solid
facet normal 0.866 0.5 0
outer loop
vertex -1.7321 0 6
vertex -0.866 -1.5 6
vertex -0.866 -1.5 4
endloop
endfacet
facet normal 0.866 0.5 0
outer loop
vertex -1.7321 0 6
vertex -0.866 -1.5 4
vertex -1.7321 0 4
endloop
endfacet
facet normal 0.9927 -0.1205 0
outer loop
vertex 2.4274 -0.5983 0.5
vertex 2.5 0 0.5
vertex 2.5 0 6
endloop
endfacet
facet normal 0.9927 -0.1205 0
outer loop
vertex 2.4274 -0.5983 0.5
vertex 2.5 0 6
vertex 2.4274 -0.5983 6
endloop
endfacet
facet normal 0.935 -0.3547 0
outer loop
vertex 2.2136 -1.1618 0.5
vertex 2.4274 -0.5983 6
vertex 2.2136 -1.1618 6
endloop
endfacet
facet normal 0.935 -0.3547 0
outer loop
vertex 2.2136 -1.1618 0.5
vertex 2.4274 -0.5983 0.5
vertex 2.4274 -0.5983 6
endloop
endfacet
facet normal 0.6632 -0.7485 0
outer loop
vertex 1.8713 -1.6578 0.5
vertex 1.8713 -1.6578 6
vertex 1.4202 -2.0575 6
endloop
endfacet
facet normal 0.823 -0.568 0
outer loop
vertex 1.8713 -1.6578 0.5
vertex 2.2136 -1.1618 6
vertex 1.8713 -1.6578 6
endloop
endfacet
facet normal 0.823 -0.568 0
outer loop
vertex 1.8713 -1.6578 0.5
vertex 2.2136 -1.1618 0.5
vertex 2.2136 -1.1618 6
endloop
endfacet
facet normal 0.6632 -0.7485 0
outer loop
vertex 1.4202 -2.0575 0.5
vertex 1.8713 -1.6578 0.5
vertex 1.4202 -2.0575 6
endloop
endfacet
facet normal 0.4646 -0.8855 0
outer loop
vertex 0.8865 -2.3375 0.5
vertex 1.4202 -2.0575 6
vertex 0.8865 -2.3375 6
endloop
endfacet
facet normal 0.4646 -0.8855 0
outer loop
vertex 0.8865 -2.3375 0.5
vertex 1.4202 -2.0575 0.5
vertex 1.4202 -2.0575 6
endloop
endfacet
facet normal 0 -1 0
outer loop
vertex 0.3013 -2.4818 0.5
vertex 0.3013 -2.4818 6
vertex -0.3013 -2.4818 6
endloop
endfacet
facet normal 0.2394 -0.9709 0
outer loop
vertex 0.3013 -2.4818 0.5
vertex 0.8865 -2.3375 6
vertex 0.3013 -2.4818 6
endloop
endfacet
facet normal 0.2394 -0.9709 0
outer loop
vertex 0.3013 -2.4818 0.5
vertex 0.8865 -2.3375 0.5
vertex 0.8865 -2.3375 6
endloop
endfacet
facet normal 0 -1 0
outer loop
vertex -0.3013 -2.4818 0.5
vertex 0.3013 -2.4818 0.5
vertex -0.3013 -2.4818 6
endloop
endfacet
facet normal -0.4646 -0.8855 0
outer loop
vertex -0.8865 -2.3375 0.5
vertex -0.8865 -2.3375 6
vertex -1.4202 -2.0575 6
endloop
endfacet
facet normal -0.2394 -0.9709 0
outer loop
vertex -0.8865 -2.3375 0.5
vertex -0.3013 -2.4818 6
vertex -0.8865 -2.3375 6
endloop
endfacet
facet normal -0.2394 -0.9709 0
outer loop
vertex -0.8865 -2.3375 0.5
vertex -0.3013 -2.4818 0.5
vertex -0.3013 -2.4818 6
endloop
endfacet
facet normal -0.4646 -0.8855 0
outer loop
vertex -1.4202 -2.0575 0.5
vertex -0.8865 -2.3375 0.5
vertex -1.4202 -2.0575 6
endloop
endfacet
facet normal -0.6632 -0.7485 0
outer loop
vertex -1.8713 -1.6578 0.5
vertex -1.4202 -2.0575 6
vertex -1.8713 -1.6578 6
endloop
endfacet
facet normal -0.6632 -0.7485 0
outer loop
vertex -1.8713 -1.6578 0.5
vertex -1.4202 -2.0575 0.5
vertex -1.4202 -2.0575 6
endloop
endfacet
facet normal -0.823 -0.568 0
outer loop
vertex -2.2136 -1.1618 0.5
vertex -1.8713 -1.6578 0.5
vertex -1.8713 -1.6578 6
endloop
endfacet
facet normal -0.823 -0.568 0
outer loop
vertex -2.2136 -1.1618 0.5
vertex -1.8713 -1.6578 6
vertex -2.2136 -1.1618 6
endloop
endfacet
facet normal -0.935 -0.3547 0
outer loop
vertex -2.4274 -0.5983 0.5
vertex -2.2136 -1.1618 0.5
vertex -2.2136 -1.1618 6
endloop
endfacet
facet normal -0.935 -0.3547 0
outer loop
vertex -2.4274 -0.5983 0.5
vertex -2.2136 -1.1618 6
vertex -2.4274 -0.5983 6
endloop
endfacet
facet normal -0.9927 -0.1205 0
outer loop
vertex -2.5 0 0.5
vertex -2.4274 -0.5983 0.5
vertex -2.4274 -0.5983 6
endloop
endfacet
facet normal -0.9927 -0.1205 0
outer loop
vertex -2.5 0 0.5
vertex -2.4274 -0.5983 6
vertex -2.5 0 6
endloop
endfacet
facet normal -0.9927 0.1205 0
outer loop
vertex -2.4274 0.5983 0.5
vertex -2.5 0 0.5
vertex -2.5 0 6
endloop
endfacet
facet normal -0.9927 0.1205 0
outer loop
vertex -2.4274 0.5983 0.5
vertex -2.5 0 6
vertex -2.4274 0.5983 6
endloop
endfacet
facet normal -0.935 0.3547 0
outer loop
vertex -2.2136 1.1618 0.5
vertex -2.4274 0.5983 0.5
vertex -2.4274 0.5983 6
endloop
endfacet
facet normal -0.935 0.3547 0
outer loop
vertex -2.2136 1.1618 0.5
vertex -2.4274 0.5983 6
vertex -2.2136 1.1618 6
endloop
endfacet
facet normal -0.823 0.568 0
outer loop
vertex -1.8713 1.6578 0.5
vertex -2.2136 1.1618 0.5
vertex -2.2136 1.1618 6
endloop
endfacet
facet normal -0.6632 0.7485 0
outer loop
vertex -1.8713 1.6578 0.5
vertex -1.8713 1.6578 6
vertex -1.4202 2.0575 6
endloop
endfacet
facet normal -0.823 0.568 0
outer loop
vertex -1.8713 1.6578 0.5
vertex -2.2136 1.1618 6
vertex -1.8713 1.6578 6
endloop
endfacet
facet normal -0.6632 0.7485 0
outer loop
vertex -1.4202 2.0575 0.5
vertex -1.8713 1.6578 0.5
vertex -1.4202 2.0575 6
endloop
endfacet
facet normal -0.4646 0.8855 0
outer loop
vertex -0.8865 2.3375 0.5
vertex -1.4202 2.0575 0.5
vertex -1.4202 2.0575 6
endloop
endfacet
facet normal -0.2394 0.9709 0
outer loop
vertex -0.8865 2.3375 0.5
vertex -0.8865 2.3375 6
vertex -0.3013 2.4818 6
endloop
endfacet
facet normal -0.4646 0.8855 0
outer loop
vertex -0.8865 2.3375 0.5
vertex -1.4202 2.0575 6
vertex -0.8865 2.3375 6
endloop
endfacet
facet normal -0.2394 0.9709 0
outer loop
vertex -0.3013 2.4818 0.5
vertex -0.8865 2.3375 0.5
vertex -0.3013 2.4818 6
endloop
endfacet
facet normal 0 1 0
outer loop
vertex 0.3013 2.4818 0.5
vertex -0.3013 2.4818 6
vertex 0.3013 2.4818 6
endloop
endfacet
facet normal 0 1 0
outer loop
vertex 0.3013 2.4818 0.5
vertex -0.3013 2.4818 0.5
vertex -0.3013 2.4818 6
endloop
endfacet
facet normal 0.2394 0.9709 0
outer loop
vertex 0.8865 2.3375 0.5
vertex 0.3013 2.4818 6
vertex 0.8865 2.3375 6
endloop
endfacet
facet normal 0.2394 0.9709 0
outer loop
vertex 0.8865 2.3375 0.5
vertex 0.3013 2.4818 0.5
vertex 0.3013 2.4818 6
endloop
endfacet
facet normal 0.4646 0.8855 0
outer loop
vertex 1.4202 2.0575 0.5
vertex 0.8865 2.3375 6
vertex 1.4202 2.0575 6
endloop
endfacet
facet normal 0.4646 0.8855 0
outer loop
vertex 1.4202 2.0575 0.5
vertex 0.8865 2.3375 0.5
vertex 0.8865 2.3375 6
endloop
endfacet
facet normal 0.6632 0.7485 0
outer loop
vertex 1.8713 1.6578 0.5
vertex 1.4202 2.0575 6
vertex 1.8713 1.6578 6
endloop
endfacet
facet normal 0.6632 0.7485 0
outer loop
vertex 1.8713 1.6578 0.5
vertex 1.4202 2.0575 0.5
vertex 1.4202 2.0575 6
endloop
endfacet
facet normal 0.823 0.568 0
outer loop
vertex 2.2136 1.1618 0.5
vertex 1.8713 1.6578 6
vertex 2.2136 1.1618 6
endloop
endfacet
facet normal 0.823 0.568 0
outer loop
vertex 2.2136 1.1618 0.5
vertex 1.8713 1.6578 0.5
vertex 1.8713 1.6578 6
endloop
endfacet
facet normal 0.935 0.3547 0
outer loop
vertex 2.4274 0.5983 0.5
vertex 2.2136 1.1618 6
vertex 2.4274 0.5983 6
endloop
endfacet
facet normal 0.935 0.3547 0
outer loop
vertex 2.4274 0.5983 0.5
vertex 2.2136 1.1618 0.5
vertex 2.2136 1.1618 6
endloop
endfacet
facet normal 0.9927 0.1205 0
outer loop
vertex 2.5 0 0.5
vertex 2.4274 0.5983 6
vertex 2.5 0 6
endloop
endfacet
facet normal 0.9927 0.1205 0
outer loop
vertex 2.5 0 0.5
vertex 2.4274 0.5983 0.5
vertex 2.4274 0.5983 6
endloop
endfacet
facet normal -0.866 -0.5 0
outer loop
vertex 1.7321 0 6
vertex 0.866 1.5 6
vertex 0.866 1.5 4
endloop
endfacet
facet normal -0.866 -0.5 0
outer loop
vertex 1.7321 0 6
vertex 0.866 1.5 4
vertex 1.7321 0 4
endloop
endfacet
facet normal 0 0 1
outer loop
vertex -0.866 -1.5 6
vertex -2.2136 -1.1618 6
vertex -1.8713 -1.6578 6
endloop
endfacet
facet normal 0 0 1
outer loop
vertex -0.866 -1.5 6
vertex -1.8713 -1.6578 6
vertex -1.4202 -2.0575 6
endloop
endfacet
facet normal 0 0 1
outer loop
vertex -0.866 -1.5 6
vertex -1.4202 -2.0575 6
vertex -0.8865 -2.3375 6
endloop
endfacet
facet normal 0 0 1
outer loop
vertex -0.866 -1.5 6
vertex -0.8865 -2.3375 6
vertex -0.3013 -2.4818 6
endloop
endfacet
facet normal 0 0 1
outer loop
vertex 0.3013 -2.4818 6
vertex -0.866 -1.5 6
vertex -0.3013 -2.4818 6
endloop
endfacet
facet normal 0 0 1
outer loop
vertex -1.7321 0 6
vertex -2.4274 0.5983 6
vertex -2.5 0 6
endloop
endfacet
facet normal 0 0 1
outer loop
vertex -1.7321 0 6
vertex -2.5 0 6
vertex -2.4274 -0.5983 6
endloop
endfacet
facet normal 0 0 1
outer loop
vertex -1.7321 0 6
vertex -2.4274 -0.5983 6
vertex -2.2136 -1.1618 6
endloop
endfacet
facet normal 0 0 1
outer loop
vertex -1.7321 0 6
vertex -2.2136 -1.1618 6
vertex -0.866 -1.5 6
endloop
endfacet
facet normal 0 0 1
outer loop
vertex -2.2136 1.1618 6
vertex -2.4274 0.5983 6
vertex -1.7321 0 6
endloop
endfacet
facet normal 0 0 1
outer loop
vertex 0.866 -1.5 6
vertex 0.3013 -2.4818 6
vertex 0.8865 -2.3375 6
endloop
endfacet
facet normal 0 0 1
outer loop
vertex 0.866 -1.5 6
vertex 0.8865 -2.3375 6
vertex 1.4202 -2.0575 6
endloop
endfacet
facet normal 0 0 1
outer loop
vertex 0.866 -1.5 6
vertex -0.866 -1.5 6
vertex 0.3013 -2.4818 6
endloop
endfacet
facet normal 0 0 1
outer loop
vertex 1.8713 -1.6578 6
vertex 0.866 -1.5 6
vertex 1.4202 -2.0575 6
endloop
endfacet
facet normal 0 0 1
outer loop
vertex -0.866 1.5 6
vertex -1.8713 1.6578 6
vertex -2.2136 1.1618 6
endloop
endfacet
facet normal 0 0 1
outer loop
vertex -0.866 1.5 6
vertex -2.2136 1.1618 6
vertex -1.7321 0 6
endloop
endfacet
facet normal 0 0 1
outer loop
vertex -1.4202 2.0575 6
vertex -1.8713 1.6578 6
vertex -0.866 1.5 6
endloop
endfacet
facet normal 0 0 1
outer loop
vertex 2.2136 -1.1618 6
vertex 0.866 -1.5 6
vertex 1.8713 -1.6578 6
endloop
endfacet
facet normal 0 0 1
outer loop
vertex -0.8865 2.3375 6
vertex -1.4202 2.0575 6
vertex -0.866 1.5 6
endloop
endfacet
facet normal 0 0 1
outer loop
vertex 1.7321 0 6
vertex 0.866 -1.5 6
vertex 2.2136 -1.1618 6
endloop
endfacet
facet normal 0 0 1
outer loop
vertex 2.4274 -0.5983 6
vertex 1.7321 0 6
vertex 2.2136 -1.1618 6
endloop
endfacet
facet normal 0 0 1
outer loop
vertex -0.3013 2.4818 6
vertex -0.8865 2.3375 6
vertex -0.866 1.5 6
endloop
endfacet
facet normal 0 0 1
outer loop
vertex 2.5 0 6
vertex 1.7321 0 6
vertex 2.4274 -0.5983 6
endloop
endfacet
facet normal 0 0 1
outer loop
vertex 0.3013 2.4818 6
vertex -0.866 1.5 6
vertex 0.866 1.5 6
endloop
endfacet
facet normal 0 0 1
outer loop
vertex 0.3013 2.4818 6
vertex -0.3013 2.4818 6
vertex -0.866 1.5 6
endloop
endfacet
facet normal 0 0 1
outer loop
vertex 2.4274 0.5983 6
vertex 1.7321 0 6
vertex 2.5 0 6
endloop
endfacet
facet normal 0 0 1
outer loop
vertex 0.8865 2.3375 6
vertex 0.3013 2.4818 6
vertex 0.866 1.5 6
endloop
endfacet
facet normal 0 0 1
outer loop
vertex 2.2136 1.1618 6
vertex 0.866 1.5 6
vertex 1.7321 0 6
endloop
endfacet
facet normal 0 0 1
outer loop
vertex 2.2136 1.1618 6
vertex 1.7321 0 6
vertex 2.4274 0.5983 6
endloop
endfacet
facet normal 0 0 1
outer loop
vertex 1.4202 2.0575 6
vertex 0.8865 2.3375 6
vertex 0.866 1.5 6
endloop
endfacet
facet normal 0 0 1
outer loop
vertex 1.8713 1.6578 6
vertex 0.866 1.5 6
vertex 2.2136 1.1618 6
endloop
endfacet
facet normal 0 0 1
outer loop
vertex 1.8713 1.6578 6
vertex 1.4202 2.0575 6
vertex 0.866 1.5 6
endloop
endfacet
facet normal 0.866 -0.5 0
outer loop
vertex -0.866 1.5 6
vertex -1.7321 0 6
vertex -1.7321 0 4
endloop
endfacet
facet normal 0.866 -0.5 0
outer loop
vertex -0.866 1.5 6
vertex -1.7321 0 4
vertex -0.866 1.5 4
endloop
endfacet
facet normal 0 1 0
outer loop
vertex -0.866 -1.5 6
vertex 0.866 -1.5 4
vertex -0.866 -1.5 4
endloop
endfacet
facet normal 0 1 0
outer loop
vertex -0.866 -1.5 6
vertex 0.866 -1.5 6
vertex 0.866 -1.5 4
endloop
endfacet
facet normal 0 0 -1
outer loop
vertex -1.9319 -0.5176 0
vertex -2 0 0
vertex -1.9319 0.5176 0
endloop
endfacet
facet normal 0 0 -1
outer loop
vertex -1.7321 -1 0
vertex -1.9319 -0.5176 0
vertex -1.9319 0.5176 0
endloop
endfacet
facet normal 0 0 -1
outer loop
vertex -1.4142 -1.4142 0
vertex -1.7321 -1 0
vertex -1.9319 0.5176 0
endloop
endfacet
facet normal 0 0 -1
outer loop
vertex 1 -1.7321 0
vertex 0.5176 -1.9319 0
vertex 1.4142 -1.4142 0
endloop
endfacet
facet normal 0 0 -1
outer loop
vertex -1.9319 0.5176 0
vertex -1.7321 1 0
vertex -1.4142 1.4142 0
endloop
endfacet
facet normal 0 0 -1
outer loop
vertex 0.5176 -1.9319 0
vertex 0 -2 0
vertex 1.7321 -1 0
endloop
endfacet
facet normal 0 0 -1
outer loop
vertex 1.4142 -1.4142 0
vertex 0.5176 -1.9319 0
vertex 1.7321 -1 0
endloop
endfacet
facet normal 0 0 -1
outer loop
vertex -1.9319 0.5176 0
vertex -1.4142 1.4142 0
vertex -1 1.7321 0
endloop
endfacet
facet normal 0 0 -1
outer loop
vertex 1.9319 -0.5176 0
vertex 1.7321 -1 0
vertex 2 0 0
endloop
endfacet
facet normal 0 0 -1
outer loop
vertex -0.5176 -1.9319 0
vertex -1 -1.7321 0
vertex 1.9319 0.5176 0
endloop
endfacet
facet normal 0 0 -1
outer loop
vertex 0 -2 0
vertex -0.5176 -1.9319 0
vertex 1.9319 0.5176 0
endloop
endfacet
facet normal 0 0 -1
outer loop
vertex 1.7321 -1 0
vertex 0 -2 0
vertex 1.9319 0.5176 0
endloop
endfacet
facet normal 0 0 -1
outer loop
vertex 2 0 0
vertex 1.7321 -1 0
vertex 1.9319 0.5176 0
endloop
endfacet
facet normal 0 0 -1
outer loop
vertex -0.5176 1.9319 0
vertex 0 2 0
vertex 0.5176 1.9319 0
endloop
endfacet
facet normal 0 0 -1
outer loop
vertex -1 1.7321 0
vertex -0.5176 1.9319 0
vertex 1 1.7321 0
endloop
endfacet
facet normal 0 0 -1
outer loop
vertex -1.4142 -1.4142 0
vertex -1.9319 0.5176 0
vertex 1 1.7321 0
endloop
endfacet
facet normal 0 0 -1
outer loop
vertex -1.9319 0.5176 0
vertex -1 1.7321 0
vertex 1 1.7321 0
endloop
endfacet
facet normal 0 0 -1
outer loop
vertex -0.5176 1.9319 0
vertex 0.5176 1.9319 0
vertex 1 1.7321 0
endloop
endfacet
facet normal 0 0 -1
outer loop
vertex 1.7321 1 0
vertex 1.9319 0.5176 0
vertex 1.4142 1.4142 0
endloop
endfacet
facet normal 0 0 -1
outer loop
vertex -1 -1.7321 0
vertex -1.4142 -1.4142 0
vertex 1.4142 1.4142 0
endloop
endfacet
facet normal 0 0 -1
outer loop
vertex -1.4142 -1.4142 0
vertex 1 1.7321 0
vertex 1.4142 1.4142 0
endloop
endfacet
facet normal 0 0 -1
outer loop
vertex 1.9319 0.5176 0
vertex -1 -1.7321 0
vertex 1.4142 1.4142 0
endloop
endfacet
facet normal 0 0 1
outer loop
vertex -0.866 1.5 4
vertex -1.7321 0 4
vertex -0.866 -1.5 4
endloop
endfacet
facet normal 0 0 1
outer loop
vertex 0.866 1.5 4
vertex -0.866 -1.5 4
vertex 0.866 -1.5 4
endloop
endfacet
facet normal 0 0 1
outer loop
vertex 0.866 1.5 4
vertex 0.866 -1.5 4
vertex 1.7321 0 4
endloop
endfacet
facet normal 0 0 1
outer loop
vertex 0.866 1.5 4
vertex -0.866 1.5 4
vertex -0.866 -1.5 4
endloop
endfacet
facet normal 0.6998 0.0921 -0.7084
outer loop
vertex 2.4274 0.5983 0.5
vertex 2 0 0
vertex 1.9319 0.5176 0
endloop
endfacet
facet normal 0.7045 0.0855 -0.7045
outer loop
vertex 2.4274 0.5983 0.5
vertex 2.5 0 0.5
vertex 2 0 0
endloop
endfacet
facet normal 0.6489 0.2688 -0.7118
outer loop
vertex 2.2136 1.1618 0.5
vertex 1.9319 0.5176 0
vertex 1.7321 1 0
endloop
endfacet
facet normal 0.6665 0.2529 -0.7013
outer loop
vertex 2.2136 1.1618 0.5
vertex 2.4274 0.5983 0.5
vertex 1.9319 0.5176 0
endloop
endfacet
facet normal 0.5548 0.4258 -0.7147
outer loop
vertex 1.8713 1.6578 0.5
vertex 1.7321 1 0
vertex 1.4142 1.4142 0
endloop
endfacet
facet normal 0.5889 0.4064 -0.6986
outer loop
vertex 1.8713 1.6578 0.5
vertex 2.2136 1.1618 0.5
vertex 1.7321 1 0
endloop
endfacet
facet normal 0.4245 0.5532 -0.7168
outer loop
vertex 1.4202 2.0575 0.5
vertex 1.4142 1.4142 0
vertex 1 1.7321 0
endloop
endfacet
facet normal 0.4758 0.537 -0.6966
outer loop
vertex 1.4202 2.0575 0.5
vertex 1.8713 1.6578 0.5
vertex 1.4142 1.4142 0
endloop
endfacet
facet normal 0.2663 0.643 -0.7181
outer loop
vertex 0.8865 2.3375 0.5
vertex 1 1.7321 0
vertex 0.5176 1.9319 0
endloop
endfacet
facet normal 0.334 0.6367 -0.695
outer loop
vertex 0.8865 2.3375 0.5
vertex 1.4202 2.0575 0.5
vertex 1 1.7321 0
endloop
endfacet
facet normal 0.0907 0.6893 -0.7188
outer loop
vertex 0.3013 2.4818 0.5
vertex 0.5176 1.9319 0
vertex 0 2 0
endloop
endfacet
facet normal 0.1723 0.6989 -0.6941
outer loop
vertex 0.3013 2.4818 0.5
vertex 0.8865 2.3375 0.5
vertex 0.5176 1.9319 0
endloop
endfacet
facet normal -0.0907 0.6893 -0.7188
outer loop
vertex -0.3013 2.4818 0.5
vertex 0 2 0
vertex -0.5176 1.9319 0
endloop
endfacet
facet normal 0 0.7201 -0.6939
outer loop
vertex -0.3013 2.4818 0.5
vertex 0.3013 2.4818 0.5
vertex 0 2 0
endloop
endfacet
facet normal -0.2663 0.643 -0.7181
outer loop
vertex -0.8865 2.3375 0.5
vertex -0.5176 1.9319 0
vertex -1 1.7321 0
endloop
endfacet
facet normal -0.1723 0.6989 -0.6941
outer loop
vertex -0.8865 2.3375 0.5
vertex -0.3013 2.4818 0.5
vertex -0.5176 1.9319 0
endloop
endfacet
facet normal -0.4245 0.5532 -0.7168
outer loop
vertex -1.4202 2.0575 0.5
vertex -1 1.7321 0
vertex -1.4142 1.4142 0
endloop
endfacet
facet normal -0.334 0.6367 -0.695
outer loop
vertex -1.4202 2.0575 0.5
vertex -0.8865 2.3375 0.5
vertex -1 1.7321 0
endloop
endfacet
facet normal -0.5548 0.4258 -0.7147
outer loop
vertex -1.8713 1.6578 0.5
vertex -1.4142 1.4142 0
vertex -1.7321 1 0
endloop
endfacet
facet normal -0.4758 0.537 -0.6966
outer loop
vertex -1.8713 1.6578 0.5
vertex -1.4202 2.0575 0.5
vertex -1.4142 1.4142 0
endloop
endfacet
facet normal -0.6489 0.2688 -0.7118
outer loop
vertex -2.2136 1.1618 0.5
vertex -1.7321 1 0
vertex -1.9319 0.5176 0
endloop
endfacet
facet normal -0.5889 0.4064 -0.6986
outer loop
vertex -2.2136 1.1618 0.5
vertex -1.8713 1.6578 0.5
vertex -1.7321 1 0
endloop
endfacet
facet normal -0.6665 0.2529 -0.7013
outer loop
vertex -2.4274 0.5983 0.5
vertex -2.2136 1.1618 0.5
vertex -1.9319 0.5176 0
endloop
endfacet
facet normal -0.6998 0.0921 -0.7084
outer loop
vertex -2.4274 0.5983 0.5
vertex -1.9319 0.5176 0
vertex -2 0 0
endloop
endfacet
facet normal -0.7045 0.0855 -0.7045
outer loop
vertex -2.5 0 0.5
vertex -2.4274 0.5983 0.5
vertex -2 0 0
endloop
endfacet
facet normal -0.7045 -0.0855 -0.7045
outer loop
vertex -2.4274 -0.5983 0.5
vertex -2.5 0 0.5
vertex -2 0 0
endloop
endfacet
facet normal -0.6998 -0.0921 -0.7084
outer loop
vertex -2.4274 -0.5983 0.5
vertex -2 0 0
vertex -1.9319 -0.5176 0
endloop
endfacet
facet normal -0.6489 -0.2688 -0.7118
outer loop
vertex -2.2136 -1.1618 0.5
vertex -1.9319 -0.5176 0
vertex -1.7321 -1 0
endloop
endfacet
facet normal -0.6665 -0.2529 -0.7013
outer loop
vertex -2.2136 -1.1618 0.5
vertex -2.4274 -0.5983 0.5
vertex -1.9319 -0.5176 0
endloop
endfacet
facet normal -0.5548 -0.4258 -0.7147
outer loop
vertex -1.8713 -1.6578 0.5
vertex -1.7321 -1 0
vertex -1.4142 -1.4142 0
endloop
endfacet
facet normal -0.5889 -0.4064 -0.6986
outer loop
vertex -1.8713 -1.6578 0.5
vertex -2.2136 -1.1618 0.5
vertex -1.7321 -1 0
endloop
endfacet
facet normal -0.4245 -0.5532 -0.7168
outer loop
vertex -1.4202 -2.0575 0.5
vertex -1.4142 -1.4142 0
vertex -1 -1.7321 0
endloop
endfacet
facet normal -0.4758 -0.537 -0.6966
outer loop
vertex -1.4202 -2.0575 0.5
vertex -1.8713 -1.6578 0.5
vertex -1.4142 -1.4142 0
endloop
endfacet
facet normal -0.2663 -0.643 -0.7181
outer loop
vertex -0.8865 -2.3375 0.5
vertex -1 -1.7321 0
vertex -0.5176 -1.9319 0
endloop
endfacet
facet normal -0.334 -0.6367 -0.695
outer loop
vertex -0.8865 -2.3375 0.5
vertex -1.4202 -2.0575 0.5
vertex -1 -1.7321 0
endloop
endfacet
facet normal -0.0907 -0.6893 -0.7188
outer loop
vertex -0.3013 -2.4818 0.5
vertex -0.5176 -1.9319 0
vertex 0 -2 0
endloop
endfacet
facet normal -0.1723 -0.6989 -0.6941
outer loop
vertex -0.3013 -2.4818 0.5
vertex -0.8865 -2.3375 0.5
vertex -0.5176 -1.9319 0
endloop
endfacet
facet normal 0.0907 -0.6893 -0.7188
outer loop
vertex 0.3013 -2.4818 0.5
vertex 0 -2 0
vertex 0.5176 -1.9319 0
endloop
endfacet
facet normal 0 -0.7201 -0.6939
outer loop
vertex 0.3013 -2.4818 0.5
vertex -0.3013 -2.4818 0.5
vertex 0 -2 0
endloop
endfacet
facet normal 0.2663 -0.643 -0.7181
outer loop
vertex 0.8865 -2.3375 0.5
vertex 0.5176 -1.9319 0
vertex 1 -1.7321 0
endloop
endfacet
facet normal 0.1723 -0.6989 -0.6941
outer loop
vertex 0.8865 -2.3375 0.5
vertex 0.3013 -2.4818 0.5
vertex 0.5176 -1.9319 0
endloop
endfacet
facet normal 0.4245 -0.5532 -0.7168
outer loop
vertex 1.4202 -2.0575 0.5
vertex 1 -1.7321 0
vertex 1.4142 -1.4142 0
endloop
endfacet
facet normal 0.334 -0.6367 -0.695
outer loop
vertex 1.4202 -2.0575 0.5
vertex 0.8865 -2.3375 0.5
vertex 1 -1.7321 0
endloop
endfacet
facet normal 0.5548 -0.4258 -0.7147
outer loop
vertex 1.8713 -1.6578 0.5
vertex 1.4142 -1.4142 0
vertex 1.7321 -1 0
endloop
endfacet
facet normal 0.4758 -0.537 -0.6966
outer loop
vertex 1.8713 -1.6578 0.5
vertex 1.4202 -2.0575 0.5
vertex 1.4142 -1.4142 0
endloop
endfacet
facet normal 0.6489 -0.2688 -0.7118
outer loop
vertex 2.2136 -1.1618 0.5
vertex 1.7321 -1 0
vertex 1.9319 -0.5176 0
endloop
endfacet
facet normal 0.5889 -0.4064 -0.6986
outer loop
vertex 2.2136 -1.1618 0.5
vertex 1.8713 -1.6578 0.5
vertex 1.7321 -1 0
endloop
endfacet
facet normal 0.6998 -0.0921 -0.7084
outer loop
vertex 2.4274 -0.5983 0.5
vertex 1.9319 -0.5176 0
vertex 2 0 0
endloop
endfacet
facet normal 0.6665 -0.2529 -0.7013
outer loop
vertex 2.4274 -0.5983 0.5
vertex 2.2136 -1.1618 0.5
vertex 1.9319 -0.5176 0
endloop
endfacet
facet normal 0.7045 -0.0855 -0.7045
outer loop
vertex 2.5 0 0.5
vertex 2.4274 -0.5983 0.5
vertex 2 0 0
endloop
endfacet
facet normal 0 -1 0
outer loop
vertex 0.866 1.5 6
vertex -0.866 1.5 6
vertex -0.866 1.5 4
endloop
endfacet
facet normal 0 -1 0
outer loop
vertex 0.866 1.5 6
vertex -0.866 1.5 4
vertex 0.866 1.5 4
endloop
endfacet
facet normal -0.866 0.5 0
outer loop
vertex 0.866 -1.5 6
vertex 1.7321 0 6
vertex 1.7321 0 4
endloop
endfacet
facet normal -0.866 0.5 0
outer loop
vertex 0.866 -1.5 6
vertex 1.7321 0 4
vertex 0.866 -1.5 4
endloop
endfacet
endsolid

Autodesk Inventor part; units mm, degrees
ref_plane "YZ Plane" through (0, 0, 0) normal (1, 0, 0) x (0, 1, 0)
ref_plane "XZ Plane" through (0, 0, 0) normal (0, 1, 0) x (-1, 0, 0)
ref_plane "XY Plane" through (0, 0, 0) normal (0, 0, 1) x (1, 0, 0)
sketch "Sketch1" plane through (0, 0, 0) normal (0, 0, 1) x (1, 0, 0)
  circle A0 centre (0, 0) radius 2.5
  dimension "Dia" = 5
extrude "Extrusion1" add sketch "Sketch1" along normal blind 6
chamfer "Chamfer1" distance 0.5 angle 45 1 edges at (-2.5, 0, 0)
thread "Thread1" size "M5x0.8" class "6g" standard "ANSI Metric M Profile" full length
sketch "Sketch2" plane through (0, 0, 6) normal (0, 0, 1) x (1, 0, 0)
  line L0 (0.866, 1.5) -> (1.7321, 0)
  line L1 (1.7321, 0) -> (0.866, -1.5)
  line L2 (0.866, -1.5) -> (-0.866, -1.5)
  line L3 (-0.866, -1.5) -> (-1.7321, 0)
  line L4 (-1.7321, 0) -> (-0.866, 1.5)
  line L5 (-0.866, 1.5) -> (0.866, 1.5)
  point P0 (0, 0)
  dimension "d8" = 3
extrude "Extrusion2" cut sketch "Sketch2" against normal blind 2
equation "\"d3\" = 0.1 * Dia"
properties part number "24-506-5F" material "Steel, High Strength Low Alloy"
